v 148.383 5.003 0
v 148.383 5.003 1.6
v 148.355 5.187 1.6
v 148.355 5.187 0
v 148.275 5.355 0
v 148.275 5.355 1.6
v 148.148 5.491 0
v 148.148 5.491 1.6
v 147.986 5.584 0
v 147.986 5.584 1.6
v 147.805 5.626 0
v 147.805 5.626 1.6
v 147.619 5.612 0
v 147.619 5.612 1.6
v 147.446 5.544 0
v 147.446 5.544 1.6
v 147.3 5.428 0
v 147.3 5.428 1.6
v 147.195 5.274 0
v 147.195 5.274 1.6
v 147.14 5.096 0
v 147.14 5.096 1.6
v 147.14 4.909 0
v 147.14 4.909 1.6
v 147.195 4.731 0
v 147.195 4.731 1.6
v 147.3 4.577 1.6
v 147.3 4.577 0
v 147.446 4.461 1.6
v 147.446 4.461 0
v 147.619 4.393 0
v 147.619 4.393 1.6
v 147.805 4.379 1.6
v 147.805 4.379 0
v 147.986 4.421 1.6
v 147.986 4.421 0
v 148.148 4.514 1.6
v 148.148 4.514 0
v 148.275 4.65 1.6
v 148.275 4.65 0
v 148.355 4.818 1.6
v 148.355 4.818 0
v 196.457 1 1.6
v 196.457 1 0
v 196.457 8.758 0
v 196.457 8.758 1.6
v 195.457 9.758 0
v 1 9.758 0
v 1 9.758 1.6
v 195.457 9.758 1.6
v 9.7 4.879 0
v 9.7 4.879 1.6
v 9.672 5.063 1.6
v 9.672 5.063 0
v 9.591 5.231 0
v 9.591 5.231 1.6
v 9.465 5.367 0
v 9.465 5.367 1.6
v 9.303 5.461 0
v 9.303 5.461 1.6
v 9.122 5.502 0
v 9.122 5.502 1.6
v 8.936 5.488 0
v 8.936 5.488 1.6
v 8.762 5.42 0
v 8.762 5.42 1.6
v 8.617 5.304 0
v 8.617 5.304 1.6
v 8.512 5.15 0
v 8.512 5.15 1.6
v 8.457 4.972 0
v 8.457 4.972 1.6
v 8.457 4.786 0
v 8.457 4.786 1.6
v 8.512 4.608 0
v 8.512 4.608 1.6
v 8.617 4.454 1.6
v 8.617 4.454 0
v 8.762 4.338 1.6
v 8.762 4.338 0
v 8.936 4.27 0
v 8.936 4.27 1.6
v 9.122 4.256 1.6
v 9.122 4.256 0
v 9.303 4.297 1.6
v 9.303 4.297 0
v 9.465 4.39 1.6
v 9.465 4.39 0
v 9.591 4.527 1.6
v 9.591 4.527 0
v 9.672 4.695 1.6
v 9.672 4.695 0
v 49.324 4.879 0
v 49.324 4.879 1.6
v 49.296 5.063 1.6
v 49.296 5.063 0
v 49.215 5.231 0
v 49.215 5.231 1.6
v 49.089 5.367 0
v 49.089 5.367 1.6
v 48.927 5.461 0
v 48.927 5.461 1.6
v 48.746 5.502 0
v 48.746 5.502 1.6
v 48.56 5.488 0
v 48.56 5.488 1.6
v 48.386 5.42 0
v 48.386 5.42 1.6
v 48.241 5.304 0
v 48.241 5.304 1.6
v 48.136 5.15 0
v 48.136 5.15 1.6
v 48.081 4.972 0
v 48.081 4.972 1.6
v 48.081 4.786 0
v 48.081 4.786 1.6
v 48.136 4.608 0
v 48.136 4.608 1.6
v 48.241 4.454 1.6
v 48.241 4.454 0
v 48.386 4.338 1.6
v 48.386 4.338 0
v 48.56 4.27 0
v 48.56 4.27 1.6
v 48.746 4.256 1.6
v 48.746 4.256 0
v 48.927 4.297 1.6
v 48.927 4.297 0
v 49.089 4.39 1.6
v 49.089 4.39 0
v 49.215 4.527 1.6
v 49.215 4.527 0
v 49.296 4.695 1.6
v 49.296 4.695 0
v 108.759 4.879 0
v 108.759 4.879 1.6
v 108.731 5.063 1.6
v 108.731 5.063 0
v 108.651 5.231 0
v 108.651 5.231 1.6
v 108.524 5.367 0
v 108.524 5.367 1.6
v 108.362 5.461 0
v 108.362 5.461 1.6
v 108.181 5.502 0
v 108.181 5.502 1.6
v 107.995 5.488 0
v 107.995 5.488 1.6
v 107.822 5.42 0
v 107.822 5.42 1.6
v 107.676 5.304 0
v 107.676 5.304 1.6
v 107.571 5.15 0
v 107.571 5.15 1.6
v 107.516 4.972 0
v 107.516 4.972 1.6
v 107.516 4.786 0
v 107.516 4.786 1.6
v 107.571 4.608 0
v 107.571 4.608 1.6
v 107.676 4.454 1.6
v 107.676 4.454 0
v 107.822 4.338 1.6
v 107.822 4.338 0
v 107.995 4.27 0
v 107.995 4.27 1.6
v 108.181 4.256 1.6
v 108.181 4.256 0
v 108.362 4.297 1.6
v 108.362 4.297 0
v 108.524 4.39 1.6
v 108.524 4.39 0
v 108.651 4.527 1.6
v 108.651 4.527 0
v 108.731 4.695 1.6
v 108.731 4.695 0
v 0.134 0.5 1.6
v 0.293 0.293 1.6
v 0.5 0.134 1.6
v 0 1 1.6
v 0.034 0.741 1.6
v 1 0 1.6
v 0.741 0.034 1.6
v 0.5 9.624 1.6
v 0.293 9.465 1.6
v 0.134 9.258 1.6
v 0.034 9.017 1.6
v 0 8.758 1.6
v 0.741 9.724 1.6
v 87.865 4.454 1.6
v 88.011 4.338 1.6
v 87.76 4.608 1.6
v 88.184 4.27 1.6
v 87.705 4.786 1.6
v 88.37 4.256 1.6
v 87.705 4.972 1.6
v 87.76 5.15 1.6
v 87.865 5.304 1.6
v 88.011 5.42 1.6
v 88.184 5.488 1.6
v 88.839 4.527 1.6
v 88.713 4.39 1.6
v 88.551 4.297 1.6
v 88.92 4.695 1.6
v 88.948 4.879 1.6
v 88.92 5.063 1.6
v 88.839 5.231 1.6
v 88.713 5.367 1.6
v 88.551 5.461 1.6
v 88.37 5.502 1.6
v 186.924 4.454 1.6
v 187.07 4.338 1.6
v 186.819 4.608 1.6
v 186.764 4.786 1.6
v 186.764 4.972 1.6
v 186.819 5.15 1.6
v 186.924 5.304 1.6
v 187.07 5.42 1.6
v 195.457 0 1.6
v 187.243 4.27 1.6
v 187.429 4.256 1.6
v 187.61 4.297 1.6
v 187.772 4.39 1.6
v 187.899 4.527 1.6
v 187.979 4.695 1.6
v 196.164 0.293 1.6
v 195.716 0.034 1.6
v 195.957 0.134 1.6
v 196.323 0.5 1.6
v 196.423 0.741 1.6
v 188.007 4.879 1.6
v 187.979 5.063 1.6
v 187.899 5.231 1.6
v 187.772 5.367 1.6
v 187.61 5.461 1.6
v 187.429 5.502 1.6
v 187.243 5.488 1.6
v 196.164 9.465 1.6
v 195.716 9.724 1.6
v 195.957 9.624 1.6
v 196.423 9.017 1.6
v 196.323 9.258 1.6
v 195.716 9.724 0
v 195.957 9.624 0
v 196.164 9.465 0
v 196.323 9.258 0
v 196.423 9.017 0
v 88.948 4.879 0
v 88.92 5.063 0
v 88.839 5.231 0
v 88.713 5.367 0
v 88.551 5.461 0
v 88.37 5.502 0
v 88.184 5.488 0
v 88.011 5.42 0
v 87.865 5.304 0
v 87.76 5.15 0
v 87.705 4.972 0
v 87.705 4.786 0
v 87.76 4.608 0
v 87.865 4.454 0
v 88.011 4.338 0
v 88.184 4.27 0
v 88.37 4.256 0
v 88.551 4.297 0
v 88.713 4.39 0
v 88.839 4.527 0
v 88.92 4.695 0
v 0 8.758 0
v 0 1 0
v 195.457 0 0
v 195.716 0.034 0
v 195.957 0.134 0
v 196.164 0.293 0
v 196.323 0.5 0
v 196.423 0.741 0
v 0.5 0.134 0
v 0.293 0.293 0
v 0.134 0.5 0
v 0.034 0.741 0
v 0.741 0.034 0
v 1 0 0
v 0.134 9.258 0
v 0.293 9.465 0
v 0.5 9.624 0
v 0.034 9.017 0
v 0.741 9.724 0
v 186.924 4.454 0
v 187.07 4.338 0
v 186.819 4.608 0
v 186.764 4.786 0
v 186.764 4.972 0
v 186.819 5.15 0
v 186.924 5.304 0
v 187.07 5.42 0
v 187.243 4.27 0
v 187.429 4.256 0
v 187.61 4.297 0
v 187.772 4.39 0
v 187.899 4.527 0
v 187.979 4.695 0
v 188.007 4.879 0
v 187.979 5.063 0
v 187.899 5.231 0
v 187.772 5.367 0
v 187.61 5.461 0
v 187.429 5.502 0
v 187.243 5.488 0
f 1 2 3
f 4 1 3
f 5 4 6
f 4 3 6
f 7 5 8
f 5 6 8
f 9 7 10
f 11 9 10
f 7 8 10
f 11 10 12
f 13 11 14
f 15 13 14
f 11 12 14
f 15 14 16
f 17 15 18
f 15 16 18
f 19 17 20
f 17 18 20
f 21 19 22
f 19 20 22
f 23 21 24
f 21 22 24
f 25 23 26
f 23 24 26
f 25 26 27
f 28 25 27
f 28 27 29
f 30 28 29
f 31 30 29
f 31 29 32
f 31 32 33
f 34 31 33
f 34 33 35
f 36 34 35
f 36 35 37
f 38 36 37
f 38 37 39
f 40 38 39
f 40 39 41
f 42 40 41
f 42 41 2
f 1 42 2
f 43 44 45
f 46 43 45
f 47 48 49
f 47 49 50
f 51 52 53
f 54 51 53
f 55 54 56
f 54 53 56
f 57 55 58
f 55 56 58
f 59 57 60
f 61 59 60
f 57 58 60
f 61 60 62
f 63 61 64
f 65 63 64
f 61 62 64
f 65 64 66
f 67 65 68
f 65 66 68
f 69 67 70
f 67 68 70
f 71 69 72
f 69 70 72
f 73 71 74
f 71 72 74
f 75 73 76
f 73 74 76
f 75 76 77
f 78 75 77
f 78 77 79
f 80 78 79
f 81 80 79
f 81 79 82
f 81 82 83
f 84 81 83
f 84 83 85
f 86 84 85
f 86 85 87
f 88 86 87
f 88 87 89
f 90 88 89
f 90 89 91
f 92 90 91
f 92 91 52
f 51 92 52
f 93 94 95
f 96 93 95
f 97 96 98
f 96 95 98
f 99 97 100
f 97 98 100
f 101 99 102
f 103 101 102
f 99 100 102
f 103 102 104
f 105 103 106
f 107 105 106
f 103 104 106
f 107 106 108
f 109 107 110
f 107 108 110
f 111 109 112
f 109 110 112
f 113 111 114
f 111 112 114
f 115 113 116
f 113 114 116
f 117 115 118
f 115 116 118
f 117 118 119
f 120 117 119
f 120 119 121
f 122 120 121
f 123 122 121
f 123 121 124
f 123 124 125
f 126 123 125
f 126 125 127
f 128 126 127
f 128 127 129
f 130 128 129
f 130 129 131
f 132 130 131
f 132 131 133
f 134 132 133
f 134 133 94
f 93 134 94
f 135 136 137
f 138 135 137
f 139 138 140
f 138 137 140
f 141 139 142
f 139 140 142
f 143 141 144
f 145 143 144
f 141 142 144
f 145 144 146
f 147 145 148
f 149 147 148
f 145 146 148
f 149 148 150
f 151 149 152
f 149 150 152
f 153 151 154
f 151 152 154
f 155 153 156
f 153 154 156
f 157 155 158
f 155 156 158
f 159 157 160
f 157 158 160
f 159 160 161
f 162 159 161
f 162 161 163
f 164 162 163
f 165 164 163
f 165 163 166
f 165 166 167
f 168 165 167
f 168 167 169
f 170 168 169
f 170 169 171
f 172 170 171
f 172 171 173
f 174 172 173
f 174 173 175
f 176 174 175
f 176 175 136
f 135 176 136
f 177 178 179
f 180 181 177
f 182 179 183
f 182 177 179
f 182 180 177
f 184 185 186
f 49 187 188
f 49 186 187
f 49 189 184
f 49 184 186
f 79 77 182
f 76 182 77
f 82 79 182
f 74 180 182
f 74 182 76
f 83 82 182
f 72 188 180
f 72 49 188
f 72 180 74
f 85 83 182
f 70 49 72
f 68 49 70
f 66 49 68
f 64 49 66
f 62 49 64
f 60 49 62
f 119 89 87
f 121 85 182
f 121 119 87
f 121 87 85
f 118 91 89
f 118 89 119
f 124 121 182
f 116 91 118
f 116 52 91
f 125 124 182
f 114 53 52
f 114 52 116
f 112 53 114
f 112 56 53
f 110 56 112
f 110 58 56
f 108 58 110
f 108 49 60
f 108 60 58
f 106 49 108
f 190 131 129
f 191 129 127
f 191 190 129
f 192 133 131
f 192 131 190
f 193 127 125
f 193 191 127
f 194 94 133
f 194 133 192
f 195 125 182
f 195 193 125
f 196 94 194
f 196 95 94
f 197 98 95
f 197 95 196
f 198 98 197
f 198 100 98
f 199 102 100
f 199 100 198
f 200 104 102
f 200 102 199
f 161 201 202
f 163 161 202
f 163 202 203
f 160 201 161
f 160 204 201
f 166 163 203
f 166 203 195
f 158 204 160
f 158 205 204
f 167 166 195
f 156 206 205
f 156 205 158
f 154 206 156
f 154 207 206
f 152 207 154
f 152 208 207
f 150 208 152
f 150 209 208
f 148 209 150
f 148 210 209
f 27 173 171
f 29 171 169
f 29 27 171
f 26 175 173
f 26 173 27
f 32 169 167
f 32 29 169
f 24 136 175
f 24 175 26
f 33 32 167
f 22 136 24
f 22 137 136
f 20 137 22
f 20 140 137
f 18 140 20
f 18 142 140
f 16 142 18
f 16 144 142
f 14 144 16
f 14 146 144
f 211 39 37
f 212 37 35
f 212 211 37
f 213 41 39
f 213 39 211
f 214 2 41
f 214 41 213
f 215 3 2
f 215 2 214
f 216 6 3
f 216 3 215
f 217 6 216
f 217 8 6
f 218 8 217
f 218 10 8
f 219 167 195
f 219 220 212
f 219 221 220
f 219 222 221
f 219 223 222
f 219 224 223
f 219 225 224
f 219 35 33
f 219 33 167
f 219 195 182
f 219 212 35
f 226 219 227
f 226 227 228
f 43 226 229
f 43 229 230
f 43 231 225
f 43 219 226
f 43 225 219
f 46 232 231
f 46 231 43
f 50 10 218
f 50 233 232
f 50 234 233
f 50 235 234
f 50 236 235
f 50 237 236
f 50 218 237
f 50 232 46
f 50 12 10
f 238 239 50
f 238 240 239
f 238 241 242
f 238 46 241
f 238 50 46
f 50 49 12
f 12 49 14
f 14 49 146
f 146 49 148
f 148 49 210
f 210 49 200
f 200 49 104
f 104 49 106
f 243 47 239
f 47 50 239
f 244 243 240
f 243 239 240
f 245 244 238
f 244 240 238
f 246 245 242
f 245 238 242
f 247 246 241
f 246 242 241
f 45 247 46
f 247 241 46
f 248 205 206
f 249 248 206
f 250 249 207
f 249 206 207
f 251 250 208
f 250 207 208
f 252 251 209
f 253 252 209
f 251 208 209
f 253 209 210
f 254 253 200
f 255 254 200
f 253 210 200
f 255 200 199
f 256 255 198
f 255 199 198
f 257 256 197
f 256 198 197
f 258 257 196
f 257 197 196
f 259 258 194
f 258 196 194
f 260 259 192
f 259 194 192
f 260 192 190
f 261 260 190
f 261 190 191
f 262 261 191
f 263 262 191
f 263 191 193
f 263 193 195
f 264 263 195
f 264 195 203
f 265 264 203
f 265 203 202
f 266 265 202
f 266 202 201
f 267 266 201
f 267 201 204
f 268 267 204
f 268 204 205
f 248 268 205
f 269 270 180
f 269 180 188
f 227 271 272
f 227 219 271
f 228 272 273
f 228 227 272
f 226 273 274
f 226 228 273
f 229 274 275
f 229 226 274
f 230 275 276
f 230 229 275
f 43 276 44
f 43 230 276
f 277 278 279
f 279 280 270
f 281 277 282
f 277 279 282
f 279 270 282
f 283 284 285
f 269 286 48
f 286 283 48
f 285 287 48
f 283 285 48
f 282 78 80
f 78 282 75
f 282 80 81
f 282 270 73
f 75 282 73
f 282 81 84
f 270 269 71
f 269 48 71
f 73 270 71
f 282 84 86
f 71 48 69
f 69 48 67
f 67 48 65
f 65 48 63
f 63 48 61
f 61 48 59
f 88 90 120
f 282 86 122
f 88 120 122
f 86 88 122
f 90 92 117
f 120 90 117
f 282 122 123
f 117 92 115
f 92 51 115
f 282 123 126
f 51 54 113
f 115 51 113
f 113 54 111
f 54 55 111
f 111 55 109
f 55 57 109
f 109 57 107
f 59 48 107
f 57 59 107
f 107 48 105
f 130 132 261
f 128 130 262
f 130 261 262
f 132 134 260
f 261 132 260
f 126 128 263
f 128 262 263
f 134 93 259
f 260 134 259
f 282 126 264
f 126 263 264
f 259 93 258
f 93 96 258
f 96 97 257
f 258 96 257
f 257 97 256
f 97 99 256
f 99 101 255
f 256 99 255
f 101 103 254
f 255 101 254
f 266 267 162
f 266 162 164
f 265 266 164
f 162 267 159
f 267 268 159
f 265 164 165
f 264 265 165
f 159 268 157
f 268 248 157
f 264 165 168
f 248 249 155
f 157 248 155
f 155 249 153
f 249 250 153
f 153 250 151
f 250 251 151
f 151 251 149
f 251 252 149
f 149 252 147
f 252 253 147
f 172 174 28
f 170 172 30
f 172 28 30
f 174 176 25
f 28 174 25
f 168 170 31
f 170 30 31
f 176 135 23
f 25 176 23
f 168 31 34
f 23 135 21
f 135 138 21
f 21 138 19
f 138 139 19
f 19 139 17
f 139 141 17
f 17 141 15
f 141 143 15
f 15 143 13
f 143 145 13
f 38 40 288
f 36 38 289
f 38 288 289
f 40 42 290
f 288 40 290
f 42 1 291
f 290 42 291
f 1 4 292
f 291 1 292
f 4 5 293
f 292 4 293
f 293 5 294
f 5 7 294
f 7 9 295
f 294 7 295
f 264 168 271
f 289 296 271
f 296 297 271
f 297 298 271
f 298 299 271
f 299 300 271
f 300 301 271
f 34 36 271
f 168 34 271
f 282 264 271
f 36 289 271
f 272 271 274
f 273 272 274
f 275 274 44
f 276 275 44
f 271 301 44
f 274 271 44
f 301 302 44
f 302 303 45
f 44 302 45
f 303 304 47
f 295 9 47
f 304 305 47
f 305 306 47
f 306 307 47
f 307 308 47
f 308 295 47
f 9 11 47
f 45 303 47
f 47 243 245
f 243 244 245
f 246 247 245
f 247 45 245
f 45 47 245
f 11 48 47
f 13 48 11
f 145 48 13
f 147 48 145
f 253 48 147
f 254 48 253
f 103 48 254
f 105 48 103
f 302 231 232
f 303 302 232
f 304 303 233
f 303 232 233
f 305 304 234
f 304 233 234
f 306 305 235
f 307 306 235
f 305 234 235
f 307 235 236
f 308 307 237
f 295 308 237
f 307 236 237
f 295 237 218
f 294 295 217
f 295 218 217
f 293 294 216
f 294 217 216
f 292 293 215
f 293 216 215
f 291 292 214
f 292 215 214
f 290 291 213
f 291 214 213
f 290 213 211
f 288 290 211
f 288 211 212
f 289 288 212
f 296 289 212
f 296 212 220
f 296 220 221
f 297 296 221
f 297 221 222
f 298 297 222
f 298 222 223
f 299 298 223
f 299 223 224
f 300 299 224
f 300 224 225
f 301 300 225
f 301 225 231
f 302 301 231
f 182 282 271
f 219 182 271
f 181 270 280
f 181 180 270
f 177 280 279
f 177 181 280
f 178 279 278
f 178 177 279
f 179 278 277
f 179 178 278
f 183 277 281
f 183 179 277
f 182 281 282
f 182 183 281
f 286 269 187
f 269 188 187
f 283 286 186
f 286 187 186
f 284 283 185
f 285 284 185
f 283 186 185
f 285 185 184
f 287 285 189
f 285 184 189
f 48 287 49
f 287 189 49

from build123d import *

# Parameters (mm, degrees)
SKETCH1_W           = 196.457160044
SKETCH1_H           = 9.757695242
BOSS_EXTRUDE1_DEPTH = 1.6002
SKETCH2_R           = 0.625
SKETCH2_R_2         = 0.62500002
CUT_EXTRUDE1_DEPTH  = 197.70584381
FILLET1_R           = 1


with BuildPart() as part:
    # Sketch1 → Boss-Extrude1 (new body)
    with BuildSketch(Plane.XY):
        with Locations((98.228580022, 4.878847621)):
            Rectangle(SKETCH1_W, SKETCH1_H)
    extrude(amount=BOSS_EXTRUDE1_DEPTH)

    # Sketch2 → Cut-Extrude1 (cut, through all)
    with BuildSketch(Plane.XY.offset(1.6002)):
        with Locations((9.074999884, 4.878847621)):
            Circle(SKETCH2_R)
        with Locations((48.698999884, 4.878847621)):
            Circle(SKETCH2_R)
        with Locations((88.323000138, 4.878847621)):
            Circle(SKETCH2_R)
        with Locations((187.38216016, 4.878847621)):
            Circle(SKETCH2_R_2)
        with Locations((147.75816016, 5.002536516)):
            Circle(SKETCH2_R_2)
        with Locations((108.13416016, 4.878847621)):
            Circle(SKETCH2_R_2)
    extrude(amount=-CUT_EXTRUDE1_DEPTH, mode=Mode.SUBTRACT)

    # Fillet1
    fillet1_edges = [part.edges().sort_by_distance(p)[0] for p in [
        (0, 0, 0.8001),
        (196.457160044, 0, 0.8001),
        (196.457160044, 9.757695242, 0.8001),
        (0, 9.757695242, 0.8001),
    ]]
    fillet(fillet1_edges, radius=FILLET1_R)


solid = part.part
